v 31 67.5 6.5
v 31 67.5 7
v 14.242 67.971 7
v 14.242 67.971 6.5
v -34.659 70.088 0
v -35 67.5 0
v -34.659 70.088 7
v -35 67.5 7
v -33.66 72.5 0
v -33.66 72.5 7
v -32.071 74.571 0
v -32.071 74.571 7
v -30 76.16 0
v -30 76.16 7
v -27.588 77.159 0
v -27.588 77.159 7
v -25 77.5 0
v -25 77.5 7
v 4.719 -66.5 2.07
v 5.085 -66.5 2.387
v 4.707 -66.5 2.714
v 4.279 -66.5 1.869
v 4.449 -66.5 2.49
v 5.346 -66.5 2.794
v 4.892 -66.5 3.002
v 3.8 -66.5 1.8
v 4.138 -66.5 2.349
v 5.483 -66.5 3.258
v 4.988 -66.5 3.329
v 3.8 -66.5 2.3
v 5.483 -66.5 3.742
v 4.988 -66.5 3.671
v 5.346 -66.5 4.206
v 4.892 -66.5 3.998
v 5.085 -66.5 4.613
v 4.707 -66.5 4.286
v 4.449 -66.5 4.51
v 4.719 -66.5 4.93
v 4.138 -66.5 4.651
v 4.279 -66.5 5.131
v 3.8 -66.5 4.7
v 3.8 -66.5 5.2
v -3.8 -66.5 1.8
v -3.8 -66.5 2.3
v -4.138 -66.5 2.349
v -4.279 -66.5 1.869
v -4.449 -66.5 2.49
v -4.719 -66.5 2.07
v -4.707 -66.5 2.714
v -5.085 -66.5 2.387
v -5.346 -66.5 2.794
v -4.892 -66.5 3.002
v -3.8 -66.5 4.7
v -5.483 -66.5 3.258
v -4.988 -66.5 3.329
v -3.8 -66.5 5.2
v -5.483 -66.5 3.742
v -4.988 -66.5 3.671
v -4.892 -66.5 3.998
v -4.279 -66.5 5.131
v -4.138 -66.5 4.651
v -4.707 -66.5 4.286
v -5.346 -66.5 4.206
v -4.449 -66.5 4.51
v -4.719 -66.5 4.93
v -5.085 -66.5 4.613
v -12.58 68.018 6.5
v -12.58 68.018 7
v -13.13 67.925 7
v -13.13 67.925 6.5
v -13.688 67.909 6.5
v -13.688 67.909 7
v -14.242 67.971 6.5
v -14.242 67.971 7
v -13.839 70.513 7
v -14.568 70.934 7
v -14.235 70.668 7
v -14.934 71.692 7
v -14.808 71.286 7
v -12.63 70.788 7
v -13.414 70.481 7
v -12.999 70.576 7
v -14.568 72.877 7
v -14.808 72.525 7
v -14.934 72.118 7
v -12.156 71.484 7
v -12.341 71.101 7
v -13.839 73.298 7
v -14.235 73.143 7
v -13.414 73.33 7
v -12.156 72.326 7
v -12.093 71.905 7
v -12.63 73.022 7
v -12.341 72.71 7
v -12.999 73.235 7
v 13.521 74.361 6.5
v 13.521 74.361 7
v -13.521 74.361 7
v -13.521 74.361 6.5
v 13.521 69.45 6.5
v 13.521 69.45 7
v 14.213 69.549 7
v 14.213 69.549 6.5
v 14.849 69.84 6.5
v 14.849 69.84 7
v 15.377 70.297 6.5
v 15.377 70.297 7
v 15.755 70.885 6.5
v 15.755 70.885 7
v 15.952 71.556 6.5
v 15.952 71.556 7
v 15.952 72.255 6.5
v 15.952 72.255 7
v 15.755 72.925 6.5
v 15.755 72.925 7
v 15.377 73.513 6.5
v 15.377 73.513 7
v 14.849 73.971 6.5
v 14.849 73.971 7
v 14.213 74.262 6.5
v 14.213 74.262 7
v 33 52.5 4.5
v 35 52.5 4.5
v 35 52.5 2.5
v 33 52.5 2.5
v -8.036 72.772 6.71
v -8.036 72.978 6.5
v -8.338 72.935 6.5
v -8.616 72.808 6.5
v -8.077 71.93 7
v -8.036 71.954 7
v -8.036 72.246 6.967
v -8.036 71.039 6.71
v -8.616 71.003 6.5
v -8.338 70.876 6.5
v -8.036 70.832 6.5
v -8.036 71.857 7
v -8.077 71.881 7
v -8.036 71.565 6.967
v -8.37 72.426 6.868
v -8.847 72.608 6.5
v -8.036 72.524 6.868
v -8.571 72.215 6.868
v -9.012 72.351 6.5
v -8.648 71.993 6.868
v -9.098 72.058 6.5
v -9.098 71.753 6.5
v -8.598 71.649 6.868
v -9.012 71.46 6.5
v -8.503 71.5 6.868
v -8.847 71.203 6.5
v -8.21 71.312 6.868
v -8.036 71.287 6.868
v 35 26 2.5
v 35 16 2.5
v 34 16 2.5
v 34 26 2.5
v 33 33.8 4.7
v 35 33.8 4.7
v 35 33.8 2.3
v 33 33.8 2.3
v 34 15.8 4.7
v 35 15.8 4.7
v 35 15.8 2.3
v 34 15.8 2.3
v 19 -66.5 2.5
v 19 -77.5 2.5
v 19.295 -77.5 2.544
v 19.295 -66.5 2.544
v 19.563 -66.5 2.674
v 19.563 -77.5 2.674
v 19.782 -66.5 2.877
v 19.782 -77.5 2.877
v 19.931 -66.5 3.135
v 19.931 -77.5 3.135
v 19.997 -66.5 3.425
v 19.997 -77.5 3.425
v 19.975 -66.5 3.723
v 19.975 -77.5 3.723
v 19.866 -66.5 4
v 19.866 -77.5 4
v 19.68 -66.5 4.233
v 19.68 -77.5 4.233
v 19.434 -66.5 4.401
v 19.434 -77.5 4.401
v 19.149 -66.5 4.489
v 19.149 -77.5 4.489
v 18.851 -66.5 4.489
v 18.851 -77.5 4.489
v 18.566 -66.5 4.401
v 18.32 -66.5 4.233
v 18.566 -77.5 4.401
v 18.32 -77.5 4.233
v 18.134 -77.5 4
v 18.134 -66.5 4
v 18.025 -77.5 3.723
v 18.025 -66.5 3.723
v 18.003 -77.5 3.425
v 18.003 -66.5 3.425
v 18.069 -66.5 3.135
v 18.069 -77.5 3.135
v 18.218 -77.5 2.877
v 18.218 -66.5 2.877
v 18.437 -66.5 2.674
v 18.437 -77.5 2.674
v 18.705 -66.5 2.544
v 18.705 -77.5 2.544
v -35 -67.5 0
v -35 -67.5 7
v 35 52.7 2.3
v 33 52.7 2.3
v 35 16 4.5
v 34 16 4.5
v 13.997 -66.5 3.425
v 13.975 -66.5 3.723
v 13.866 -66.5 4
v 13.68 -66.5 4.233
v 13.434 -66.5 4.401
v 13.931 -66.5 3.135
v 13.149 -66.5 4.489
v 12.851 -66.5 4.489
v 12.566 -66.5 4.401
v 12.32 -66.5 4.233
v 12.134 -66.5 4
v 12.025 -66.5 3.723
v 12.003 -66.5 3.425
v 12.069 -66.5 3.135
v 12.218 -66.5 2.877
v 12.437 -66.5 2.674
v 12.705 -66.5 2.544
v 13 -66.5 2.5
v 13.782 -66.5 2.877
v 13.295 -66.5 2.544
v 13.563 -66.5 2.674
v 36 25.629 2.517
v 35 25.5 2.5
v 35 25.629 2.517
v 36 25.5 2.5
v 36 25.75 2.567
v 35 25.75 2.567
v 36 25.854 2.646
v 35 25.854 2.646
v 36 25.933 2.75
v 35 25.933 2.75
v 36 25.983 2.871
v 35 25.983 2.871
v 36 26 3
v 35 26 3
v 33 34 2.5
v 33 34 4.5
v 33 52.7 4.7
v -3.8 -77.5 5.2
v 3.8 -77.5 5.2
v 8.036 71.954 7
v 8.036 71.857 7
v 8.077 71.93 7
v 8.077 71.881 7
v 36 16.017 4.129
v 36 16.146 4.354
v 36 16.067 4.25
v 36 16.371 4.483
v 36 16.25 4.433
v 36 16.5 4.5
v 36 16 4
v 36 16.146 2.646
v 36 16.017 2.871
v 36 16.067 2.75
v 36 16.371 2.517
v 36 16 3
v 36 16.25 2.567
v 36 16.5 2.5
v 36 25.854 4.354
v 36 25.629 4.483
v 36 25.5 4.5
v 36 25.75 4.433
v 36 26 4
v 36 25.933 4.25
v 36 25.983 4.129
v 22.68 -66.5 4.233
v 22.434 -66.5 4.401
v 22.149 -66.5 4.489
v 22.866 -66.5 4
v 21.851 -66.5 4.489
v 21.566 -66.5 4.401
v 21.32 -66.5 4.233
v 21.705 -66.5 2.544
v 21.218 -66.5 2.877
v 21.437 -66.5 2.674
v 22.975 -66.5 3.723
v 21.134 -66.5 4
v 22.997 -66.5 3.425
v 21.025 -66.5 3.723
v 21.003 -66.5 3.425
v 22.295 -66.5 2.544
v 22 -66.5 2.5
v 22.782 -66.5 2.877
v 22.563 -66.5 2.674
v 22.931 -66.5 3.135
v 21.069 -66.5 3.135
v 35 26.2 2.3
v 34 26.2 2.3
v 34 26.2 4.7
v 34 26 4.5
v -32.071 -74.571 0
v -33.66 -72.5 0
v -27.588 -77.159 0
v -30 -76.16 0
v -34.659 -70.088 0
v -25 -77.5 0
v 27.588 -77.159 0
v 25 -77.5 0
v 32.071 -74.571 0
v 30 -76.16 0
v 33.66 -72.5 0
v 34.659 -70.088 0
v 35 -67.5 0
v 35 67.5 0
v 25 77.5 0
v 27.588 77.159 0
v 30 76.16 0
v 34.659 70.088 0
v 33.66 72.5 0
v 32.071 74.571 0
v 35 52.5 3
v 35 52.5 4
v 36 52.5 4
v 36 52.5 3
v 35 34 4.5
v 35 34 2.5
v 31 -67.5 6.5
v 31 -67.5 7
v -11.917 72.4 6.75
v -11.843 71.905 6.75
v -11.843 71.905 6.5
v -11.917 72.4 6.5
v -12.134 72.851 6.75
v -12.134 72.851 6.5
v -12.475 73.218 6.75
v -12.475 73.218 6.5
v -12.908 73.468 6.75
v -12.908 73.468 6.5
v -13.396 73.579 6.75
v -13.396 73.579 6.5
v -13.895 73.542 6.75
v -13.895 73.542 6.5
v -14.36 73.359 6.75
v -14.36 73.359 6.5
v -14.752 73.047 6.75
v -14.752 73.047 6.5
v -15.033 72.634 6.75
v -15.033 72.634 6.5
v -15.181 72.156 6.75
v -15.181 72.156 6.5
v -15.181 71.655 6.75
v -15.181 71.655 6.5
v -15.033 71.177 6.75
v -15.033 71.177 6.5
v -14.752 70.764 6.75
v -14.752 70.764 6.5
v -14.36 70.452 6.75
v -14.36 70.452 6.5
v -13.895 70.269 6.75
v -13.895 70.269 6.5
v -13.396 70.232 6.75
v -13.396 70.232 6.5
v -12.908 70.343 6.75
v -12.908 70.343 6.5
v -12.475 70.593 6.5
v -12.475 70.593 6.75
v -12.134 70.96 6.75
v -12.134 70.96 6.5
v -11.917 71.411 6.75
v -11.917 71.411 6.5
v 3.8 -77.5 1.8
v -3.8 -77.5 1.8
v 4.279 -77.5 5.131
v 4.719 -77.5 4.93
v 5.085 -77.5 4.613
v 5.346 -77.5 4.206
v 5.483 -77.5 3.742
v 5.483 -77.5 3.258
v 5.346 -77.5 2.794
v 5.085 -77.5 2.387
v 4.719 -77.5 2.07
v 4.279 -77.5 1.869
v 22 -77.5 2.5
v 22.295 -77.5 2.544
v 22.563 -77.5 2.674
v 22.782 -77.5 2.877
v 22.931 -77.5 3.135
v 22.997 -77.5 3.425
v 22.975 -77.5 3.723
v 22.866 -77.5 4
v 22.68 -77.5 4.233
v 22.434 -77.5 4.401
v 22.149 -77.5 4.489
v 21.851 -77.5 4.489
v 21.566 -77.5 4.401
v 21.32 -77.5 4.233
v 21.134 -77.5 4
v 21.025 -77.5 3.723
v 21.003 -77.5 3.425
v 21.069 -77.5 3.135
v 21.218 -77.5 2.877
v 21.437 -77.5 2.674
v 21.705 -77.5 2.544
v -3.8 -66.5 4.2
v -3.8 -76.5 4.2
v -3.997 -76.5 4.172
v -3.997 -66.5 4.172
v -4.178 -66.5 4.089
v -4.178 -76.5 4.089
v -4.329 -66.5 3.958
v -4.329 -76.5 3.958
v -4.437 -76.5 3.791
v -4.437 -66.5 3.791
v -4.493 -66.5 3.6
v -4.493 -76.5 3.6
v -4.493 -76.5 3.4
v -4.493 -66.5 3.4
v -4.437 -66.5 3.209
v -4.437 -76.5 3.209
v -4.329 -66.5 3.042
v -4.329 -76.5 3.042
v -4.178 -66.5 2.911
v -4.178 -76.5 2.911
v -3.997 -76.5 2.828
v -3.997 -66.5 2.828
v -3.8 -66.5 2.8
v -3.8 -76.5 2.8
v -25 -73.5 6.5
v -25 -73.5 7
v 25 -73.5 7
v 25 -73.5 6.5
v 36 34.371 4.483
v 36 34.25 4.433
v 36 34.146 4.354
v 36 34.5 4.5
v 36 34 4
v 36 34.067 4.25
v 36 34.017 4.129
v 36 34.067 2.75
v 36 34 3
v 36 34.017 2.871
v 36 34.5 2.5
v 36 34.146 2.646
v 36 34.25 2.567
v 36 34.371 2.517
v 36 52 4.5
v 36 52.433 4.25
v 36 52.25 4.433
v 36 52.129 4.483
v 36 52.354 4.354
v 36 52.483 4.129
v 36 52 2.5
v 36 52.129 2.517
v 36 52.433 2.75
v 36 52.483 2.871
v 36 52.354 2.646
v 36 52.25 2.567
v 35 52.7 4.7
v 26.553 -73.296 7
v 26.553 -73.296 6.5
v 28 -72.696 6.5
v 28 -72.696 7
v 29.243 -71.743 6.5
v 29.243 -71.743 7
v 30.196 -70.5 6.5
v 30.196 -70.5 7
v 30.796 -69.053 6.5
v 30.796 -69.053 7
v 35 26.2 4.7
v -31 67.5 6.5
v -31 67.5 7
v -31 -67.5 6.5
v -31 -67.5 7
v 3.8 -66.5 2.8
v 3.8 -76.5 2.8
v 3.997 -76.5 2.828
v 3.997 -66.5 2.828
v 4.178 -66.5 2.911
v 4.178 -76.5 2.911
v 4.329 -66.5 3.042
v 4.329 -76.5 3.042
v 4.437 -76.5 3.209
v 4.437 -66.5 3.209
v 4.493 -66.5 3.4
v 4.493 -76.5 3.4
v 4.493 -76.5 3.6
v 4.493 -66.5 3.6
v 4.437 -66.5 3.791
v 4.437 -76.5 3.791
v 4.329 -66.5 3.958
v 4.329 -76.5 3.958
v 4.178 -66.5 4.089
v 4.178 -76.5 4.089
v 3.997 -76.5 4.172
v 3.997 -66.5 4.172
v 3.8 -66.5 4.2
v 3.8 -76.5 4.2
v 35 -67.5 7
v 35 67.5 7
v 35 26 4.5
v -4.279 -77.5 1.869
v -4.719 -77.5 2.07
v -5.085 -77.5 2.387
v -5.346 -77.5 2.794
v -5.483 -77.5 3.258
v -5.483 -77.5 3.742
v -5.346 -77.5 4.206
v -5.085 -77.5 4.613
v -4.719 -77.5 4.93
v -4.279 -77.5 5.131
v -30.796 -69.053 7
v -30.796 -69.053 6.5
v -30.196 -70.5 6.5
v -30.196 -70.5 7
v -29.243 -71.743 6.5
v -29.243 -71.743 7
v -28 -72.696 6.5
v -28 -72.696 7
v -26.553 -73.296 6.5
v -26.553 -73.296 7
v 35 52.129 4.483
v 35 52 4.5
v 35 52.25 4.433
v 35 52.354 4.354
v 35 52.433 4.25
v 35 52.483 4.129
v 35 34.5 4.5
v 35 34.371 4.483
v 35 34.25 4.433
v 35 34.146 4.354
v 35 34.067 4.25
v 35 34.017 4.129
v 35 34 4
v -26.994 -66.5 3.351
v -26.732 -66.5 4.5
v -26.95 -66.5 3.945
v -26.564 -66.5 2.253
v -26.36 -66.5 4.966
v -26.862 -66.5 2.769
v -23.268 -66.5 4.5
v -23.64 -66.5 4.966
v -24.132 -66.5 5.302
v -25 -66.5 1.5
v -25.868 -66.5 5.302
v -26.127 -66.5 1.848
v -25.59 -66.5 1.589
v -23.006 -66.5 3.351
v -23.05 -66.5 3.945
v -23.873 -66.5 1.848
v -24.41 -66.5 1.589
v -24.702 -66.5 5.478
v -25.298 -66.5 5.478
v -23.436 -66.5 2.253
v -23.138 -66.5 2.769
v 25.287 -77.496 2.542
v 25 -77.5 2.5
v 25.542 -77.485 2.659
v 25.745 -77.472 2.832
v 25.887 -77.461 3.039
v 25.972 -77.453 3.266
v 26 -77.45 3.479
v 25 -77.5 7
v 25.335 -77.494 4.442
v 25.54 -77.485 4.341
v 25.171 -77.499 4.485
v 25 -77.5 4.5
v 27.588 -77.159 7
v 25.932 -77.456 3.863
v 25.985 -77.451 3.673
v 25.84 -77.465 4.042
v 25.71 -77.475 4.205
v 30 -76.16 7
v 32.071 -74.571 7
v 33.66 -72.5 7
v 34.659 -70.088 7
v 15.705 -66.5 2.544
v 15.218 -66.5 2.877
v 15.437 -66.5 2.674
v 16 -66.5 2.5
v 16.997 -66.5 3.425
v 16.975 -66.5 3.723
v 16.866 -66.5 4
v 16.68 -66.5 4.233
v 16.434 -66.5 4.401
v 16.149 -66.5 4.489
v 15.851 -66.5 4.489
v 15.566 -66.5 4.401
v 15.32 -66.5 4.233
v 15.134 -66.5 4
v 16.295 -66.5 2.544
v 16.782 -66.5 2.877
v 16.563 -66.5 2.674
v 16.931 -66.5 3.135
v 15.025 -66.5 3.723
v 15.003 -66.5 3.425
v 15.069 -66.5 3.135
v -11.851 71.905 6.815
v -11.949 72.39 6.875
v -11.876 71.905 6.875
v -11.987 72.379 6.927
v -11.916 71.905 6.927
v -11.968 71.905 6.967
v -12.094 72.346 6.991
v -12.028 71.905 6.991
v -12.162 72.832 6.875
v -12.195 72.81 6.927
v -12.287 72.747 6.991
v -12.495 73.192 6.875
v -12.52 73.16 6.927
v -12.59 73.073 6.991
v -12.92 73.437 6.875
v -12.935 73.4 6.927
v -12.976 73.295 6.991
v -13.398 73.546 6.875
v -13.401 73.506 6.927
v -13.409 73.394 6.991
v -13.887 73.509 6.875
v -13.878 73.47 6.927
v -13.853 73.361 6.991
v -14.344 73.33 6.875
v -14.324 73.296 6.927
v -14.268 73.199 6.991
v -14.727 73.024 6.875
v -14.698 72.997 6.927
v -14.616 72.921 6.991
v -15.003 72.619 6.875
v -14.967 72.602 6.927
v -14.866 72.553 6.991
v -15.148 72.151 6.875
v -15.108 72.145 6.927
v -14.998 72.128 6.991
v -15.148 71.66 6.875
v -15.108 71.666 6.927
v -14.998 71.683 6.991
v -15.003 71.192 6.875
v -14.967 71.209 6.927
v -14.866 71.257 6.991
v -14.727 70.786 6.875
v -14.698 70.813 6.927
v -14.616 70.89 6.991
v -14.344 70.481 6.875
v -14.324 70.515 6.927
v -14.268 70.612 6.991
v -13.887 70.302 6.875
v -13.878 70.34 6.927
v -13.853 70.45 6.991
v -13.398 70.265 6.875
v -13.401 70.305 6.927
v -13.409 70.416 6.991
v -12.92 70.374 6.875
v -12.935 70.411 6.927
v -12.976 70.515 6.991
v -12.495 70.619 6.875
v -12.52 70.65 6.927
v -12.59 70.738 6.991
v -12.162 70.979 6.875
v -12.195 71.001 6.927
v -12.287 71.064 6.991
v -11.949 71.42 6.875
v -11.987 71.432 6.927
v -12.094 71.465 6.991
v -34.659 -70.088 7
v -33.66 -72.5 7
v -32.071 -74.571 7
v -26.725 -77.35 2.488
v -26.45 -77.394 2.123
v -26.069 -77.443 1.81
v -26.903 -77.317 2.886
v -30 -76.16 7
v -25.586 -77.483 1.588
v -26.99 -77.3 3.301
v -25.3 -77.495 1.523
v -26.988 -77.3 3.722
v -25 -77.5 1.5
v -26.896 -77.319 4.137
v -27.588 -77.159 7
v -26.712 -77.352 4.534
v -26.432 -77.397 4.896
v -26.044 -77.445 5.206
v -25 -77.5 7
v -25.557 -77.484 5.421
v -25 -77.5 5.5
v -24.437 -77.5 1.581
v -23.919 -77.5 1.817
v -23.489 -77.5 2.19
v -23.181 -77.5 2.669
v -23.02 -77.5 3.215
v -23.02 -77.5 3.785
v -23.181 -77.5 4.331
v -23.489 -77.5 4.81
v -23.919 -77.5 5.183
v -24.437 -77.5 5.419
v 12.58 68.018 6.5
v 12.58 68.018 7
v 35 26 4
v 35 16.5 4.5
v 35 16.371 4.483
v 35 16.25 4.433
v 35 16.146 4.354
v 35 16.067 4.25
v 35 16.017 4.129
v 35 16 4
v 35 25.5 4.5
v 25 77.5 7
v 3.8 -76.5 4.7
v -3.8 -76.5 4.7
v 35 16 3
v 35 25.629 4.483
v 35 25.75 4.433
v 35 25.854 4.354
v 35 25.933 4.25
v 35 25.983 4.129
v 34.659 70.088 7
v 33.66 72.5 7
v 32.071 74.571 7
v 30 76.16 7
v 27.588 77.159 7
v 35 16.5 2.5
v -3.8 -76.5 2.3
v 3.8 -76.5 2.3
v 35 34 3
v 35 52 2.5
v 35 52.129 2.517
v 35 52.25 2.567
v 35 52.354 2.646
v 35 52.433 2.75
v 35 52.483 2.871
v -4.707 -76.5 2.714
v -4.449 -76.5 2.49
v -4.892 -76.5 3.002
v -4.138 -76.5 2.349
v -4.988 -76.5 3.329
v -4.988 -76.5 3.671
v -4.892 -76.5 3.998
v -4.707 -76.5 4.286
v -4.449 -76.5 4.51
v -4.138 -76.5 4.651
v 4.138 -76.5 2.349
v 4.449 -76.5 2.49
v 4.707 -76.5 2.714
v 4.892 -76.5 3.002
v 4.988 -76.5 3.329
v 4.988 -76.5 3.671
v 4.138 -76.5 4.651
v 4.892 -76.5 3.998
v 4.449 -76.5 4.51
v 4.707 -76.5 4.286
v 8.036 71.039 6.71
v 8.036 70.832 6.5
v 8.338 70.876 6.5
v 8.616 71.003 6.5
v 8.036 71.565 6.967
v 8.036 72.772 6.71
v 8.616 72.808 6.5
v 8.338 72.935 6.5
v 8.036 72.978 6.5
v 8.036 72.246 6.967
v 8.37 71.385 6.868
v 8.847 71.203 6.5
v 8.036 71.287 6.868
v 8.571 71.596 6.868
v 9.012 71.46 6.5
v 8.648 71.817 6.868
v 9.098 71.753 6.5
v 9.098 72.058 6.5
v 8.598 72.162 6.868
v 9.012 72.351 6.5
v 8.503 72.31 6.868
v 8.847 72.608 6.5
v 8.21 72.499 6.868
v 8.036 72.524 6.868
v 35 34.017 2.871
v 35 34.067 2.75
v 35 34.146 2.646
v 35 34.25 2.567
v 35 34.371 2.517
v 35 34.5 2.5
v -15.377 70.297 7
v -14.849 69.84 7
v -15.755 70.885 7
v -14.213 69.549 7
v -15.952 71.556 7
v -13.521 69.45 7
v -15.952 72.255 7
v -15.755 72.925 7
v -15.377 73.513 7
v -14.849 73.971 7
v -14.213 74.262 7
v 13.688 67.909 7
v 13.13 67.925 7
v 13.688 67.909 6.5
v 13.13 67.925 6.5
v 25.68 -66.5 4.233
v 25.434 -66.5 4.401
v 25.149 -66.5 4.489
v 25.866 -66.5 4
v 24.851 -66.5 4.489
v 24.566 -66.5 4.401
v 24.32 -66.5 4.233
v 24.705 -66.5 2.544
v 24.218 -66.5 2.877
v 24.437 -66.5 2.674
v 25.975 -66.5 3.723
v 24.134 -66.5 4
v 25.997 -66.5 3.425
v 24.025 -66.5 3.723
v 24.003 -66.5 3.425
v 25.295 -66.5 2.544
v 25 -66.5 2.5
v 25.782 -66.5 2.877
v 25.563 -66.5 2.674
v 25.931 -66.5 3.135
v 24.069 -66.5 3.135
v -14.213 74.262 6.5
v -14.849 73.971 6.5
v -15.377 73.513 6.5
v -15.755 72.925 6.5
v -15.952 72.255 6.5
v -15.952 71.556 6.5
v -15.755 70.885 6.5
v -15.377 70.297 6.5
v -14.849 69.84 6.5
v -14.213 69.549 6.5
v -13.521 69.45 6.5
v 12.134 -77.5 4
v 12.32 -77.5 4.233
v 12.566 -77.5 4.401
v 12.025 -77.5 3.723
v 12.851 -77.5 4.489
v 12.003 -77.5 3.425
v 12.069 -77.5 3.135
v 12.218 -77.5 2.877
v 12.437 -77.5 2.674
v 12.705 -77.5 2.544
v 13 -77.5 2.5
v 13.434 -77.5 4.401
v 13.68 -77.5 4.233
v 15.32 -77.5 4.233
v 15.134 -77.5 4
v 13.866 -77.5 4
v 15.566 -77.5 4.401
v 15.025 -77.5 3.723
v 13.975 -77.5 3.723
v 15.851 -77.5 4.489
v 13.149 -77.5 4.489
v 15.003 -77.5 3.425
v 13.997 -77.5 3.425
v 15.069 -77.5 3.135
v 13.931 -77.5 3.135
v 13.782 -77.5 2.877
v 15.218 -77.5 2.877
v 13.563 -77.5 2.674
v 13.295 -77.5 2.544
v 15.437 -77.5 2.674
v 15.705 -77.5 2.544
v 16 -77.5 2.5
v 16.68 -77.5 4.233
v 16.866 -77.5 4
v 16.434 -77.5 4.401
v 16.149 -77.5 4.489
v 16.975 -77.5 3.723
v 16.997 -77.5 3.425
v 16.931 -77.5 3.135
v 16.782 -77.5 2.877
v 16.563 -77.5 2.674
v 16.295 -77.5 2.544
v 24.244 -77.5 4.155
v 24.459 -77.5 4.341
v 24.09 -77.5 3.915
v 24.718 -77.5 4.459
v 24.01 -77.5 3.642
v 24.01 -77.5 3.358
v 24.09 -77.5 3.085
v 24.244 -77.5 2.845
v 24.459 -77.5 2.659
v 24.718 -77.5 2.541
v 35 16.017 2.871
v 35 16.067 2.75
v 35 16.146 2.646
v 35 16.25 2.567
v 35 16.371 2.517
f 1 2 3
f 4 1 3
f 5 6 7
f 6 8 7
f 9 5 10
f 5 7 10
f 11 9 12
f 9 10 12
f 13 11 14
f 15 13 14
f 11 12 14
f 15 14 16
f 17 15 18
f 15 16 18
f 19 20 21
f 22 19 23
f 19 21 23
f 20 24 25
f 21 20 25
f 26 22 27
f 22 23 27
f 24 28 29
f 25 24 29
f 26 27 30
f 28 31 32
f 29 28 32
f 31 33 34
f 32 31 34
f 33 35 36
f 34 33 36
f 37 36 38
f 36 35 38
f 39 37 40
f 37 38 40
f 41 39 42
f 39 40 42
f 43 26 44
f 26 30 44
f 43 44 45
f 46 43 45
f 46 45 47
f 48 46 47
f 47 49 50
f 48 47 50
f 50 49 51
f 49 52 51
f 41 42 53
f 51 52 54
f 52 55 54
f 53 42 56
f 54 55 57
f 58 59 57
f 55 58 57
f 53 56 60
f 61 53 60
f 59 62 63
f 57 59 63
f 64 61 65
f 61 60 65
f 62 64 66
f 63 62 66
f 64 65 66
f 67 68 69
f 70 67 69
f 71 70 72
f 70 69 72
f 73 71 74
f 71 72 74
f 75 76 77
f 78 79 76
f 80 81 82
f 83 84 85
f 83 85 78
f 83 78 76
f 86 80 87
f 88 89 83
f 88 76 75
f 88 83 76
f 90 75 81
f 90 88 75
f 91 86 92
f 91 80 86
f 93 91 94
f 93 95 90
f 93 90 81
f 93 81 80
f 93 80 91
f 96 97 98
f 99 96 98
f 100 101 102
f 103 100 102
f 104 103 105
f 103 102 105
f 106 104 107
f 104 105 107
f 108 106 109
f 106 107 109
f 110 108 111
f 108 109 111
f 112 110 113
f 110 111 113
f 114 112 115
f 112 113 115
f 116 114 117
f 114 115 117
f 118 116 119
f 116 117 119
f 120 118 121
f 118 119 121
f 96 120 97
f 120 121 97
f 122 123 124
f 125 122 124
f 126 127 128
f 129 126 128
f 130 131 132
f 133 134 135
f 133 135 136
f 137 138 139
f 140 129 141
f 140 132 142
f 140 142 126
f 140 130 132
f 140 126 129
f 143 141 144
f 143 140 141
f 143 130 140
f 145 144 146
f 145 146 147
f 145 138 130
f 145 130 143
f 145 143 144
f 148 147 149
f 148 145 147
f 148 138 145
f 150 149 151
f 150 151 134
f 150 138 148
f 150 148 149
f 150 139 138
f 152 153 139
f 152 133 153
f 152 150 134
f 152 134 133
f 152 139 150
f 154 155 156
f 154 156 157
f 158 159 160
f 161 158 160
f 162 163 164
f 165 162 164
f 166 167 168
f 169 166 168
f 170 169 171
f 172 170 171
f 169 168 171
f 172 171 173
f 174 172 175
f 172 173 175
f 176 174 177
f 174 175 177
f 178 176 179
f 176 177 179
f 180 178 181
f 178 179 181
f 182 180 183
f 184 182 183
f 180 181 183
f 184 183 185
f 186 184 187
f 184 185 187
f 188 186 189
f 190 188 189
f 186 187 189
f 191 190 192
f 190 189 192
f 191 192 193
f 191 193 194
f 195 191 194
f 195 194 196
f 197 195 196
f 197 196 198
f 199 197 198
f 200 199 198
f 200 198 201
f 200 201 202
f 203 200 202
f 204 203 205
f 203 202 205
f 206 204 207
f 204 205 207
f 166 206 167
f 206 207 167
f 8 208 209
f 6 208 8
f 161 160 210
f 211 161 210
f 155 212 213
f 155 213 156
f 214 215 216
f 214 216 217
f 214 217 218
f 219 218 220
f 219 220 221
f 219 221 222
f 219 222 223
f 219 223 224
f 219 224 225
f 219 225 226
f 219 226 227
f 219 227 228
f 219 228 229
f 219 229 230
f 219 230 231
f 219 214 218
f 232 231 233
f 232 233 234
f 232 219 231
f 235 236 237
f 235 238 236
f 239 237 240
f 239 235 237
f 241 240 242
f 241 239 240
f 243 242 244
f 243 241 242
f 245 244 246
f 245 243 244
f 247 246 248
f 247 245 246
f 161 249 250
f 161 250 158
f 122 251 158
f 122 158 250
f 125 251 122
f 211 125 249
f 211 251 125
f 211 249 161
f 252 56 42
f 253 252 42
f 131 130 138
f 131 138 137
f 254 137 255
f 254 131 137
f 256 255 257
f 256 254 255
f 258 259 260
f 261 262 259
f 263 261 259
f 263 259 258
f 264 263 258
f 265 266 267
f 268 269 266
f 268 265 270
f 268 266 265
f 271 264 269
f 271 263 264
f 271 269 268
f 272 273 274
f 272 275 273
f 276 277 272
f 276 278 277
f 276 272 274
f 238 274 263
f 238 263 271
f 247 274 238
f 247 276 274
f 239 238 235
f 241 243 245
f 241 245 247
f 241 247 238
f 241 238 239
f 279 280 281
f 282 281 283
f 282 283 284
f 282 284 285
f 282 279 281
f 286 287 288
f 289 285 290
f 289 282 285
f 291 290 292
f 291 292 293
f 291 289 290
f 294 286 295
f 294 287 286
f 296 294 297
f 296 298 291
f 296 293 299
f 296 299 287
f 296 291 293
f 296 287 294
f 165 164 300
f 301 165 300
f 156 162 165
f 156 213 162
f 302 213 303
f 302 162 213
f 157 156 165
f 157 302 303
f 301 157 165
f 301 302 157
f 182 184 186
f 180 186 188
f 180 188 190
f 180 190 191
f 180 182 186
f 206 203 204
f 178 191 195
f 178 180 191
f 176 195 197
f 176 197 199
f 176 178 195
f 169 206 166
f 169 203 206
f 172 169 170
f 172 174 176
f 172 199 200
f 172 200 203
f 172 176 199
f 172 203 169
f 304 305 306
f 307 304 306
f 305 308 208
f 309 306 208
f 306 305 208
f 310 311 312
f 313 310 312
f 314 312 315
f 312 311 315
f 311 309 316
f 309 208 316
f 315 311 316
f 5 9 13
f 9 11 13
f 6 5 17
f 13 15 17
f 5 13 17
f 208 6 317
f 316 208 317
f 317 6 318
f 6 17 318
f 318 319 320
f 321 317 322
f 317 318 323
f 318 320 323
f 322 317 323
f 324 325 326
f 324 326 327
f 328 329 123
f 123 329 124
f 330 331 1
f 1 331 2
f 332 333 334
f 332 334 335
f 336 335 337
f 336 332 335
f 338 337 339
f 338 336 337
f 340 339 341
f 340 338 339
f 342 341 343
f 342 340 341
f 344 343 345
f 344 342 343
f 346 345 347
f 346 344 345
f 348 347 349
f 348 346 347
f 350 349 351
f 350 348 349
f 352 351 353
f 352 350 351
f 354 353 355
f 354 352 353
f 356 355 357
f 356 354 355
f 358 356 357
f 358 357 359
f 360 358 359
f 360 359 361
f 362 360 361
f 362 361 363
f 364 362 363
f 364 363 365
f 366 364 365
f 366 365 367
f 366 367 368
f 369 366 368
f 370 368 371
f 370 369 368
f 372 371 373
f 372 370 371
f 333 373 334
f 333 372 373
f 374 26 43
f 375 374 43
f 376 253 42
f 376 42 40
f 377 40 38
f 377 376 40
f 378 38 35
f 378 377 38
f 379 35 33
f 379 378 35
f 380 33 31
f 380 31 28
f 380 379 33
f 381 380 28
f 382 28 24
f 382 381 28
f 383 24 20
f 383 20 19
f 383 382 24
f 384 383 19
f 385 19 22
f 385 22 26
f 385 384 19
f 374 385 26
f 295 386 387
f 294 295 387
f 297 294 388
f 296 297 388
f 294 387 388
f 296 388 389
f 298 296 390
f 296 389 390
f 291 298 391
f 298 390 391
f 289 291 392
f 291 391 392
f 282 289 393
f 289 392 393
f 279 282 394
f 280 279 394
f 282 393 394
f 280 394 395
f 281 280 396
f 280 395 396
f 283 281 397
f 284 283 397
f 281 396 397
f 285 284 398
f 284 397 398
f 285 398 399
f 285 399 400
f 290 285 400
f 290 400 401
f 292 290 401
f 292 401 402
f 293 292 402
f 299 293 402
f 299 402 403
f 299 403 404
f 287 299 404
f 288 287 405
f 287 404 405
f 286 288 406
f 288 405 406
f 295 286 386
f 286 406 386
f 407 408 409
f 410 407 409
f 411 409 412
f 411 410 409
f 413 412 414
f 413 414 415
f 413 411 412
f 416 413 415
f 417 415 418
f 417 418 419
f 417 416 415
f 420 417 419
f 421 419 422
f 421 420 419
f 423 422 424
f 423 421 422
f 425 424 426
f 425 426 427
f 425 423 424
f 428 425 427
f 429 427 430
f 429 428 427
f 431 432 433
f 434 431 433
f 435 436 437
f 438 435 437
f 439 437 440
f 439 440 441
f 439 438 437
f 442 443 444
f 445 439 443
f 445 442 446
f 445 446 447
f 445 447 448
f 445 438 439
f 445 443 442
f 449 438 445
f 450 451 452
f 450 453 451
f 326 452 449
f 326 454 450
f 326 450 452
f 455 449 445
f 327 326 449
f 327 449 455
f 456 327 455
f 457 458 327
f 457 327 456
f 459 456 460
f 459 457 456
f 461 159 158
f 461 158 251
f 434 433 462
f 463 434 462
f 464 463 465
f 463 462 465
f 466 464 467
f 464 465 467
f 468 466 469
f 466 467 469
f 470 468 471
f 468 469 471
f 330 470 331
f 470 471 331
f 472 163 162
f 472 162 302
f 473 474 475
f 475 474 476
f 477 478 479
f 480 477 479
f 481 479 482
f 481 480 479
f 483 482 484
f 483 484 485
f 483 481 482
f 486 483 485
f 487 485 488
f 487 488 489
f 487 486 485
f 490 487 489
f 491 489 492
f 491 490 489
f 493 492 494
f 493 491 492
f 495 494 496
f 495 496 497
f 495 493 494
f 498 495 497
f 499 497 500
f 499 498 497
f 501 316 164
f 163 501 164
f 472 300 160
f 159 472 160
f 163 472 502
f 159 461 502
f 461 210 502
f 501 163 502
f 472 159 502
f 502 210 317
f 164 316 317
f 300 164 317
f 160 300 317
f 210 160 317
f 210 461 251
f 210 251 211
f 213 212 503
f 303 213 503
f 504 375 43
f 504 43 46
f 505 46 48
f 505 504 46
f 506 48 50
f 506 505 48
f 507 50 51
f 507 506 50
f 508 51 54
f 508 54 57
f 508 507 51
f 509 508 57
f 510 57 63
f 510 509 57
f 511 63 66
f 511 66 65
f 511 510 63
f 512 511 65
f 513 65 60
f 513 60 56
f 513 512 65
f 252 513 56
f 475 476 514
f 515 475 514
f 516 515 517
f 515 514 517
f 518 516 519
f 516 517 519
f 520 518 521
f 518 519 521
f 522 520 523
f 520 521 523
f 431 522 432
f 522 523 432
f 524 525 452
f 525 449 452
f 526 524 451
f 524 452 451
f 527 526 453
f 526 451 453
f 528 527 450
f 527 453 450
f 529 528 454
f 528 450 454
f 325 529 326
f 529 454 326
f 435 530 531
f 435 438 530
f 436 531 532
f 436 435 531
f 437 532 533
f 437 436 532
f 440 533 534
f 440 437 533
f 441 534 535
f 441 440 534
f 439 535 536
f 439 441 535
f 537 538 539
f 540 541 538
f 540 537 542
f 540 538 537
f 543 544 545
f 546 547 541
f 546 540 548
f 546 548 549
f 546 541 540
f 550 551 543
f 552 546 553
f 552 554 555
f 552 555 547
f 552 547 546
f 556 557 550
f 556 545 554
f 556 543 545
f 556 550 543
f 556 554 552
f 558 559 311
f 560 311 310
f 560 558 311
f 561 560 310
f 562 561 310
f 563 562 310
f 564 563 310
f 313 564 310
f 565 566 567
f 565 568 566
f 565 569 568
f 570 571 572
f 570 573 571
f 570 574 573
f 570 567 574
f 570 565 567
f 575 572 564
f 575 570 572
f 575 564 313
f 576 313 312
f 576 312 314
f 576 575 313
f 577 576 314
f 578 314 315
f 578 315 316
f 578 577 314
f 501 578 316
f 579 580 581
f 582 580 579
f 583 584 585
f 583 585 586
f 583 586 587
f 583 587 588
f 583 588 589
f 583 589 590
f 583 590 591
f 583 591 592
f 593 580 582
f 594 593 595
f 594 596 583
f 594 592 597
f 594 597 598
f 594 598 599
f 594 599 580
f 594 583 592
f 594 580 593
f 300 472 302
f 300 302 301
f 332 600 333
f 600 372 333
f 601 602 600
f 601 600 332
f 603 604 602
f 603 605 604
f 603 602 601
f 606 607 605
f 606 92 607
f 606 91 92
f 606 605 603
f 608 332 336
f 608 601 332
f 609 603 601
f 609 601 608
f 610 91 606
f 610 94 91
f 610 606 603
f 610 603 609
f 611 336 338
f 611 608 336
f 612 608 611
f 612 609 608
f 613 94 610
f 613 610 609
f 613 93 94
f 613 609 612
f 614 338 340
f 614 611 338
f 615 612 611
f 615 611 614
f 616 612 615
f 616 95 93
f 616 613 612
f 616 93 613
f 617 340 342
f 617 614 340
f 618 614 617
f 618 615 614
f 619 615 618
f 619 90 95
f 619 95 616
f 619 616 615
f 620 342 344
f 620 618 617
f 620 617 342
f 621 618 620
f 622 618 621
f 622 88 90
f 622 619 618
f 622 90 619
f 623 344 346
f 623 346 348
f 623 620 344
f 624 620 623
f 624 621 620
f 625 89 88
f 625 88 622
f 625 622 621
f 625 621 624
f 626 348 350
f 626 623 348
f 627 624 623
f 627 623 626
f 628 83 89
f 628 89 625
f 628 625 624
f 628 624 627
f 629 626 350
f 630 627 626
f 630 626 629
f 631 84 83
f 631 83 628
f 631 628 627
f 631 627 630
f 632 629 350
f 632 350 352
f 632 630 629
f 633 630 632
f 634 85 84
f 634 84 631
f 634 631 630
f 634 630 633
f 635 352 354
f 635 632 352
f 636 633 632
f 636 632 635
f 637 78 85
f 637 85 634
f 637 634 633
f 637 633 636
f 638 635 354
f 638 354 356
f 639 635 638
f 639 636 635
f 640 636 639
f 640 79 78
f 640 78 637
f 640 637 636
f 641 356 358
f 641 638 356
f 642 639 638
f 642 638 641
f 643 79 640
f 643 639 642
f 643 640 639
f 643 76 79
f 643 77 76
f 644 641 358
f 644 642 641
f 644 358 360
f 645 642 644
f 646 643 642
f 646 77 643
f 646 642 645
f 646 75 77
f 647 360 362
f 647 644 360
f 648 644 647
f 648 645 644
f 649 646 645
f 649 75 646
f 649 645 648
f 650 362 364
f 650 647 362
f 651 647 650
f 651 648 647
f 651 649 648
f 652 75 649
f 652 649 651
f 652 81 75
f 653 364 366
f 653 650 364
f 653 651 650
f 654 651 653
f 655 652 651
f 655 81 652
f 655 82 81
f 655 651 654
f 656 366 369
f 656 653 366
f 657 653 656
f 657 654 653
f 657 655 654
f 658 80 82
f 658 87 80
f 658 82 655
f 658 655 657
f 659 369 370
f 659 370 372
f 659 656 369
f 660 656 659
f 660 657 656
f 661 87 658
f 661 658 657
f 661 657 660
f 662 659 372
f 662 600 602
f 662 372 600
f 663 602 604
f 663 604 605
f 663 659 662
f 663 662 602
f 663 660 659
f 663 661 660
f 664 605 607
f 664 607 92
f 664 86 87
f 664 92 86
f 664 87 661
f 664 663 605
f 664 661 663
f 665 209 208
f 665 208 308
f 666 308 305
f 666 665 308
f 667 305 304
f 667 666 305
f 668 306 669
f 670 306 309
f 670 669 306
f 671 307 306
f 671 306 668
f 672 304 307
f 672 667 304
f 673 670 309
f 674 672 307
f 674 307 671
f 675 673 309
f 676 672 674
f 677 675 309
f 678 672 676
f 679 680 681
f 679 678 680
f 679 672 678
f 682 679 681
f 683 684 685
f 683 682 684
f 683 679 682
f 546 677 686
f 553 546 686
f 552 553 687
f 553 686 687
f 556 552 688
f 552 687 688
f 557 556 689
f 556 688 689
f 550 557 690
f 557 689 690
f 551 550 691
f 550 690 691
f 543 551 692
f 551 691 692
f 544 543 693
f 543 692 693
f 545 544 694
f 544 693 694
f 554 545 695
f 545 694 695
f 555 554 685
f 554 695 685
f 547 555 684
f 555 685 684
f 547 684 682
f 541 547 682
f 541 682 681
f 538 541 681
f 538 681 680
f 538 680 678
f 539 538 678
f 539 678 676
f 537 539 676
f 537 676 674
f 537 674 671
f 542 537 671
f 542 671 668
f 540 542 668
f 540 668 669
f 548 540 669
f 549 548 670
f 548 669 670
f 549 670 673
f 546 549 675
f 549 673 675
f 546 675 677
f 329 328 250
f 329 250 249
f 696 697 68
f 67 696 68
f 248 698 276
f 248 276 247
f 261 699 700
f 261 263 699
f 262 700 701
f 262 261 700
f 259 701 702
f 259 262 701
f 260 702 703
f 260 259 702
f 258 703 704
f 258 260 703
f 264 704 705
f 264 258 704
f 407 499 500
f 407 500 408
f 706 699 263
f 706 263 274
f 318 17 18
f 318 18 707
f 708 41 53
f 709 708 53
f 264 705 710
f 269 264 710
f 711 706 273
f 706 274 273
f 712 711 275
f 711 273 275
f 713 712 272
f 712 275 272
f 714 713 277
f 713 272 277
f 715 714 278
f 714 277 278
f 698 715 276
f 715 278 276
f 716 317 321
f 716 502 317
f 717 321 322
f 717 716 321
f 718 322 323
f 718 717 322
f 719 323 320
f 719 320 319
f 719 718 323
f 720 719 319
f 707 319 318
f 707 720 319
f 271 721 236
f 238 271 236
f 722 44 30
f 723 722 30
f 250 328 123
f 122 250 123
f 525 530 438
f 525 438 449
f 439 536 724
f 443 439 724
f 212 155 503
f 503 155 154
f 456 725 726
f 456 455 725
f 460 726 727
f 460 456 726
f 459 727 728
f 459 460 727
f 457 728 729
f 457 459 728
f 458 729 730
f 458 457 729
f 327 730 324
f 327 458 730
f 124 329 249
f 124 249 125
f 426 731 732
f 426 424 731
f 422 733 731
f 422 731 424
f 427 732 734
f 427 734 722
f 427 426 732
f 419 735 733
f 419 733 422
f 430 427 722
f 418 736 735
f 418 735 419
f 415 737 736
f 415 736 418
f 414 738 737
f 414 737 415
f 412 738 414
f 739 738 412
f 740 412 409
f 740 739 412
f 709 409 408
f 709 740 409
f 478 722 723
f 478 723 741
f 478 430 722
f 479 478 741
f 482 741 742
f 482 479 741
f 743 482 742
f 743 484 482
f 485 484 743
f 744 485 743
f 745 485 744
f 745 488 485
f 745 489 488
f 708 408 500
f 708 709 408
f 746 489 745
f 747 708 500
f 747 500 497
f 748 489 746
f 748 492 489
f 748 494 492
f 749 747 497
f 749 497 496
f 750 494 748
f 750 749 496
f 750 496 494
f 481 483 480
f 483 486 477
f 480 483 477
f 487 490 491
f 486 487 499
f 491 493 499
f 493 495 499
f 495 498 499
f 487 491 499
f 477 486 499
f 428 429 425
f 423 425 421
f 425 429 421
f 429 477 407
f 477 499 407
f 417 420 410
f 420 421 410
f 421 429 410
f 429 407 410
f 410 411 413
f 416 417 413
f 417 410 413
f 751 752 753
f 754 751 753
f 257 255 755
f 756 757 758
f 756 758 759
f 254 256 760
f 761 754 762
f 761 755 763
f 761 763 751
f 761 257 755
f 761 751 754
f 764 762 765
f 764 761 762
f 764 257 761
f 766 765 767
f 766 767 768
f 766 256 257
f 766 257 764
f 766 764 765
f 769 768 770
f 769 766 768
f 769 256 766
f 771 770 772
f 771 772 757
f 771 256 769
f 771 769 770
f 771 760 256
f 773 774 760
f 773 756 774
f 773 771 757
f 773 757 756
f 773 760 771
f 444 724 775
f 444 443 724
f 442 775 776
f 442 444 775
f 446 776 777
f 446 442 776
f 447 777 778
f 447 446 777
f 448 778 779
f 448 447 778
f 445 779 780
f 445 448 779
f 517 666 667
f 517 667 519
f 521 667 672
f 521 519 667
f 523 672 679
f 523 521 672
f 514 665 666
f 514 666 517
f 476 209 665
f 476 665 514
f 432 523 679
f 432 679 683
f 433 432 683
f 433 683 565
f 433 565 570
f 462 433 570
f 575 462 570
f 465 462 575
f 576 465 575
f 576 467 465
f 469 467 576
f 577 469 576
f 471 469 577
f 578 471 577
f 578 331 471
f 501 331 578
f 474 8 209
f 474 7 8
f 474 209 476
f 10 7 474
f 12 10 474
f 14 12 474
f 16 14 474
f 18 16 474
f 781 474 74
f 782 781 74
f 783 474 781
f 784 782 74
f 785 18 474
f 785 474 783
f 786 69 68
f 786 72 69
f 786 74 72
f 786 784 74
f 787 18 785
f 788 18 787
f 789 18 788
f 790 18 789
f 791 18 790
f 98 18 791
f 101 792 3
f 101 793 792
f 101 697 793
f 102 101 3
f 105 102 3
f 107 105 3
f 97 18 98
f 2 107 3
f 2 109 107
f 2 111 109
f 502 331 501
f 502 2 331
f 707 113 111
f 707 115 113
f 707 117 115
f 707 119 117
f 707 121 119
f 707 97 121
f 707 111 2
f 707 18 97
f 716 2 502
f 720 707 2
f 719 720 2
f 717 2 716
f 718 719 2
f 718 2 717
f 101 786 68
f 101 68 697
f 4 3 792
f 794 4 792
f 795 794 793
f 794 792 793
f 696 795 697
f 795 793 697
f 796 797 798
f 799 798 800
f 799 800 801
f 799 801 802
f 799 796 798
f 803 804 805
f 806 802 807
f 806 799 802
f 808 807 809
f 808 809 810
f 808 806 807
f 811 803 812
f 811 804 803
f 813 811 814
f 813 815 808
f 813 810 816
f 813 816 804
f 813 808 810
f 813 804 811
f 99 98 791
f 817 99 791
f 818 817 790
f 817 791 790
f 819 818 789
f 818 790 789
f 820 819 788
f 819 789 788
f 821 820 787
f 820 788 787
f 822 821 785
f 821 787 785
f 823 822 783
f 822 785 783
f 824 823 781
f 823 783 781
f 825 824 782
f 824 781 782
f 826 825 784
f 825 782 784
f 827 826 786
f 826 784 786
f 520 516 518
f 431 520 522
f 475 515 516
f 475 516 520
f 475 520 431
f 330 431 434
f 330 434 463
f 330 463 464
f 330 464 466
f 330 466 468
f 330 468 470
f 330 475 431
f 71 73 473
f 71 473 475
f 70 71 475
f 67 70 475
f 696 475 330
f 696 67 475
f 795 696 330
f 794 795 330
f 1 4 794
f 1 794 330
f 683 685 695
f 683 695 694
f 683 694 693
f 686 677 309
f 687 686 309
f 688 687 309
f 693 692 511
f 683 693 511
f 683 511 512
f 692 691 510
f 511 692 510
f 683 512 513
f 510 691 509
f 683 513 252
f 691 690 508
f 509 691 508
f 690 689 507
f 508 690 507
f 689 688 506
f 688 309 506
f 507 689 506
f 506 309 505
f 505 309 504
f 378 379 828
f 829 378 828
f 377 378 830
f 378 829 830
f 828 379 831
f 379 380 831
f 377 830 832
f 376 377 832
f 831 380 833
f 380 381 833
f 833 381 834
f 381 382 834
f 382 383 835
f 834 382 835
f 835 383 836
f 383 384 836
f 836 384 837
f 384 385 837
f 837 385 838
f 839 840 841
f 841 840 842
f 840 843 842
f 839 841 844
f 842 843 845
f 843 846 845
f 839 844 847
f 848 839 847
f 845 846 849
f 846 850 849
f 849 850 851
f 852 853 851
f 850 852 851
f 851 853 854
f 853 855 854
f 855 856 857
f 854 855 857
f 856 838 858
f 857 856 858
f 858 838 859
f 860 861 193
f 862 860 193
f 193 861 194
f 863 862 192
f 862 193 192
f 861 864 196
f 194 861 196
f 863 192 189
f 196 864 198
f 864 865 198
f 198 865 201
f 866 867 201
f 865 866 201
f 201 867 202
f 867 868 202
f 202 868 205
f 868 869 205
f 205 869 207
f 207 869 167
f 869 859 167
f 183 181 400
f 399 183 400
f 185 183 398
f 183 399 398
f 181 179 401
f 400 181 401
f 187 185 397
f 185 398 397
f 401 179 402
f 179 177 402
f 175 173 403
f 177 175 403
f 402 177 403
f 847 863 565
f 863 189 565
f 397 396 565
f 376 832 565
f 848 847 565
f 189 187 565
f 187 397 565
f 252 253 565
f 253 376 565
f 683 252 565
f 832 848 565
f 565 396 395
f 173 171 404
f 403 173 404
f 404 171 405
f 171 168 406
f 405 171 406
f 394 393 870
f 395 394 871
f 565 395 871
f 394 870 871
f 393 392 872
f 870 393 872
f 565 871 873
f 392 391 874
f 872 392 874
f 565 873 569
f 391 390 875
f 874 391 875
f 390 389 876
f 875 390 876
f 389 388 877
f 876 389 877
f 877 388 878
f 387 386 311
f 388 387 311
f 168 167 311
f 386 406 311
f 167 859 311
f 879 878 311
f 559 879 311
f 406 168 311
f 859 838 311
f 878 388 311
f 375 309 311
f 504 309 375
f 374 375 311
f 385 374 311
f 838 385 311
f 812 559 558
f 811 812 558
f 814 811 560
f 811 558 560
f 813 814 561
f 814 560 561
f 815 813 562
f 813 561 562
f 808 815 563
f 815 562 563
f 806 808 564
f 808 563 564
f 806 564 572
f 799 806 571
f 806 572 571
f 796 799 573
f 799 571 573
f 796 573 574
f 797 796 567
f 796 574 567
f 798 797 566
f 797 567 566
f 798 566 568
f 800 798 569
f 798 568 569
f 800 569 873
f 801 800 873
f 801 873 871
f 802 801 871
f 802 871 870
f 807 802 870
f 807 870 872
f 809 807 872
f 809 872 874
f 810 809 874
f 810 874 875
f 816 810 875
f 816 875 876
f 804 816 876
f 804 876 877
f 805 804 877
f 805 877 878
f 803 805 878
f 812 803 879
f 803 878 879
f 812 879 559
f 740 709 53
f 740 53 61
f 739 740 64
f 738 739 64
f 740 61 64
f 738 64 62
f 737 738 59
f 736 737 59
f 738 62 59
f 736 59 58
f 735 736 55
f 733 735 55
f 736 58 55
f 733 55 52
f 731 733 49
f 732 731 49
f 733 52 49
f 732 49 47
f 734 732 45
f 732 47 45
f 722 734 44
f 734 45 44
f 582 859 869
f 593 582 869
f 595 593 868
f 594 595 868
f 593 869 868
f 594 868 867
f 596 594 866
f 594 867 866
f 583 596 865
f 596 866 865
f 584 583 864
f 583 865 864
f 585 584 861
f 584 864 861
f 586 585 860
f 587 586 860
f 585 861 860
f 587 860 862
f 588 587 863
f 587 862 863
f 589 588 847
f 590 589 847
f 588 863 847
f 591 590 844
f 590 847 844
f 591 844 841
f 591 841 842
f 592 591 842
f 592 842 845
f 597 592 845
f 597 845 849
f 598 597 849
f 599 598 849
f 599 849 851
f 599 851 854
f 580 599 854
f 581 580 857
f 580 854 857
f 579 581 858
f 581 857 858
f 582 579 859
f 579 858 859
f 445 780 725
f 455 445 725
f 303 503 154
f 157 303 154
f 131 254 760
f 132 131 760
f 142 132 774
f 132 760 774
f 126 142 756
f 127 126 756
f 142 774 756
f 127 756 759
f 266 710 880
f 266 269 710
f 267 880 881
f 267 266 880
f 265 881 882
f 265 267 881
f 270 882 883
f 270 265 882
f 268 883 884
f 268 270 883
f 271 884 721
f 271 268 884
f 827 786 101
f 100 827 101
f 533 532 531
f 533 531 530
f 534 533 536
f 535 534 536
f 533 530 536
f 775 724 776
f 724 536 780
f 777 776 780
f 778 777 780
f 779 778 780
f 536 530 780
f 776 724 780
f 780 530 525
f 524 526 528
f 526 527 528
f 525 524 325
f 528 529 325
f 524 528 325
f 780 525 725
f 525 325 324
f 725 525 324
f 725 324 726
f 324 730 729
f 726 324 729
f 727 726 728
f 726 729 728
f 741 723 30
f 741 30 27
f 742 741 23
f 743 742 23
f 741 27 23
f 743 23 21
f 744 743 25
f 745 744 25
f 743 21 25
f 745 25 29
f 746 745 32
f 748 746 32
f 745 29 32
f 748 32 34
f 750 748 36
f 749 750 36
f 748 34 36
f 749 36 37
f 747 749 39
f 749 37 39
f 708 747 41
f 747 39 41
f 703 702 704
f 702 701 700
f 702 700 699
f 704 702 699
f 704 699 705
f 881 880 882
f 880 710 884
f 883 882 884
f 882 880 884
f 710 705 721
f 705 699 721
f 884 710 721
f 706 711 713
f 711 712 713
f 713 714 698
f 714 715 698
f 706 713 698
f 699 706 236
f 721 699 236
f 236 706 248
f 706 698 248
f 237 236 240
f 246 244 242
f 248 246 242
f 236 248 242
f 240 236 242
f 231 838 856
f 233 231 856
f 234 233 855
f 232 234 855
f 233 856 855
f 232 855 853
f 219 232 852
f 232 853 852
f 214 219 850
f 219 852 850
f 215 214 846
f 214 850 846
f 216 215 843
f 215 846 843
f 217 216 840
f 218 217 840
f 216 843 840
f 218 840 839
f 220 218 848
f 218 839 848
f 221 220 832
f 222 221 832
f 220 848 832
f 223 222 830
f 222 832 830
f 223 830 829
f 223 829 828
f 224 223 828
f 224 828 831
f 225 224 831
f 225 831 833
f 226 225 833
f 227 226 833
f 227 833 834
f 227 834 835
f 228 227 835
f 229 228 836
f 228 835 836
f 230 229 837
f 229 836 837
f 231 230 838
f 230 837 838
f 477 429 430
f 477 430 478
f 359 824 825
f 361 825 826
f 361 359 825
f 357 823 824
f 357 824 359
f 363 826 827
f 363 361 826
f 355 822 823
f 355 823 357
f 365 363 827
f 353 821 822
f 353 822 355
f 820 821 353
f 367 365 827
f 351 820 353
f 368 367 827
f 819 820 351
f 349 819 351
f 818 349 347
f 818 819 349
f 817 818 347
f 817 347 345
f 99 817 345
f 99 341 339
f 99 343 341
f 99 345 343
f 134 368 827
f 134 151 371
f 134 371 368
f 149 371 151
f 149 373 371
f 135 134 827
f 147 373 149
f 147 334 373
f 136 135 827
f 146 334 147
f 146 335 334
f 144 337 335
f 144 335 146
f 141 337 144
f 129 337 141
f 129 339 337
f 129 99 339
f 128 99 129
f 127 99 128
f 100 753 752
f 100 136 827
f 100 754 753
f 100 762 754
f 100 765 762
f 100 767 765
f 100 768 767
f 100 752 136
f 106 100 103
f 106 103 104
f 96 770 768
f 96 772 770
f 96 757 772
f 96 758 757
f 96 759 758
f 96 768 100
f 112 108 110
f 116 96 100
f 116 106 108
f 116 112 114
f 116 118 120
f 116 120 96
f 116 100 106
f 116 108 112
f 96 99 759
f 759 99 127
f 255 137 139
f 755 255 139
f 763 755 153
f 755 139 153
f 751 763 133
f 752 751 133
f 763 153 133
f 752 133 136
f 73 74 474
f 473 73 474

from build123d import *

# Parameters (mm, degrees)
SKETCH1_W           = 70
SKETCH1_H           = 155
BOSS_EXTRUDE1_DEPTH = 7
FILLET1_R           = 10
SKETCH3_W           = 2.4
SKETCH3_H           = 18.9
SKETCH3_W_2         = 2
SKETCH3_H_2         = 18.5
CUT_EXTRUDE1_DEPTH  = 2
SKETCH3_2_W         = 2
SKETCH3_2_H         = 18.5
BOSS_EXTRUDE2_DEPTH = 1
FILLET2_R           = 0.5
SKETCH4_W           = 2.4
SKETCH4_H           = 10.4
SKETCH4_W_2         = 2
SKETCH4_H_2         = 10
CUT_EXTRUDE2_DEPTH  = 1
SKETCH4_2_W         = 2
SKETCH4_2_H         = 10
BOSS_EXTRUDE3_DEPTH = 1
FILLET3_R           = 0.5
SKETCH6_R           = 2
SKETCH6_R_2         = 1
CUT_EXTRUDE3_DEPTH  = 11
BOSS_EXTRUDE4_DEPTH = 10
SKETCH8_R           = 1.678551751
CUT_EXTRUDE4_DEPTH  = 0.5
FILLET4_R           = 1.3
FILLET5_R           = 0.25


with BuildPart() as part:
    # Sketch1 → Boss-Extrude1 (new body)
    with BuildSketch(Plane.XY):
        Rectangle(SKETCH1_W, SKETCH1_H)
    extrude(amount=BOSS_EXTRUDE1_DEPTH)

    # Fillet1
    fillet1_edges = [part.edges().sort_by_distance(p)[0] for p in [
        (35, -77.5, 3.5),
        (-35, -77.5, 3.5),
        (-35, 77.5, 3.5),
        (35, 77.5, 3.5),
    ]]
    fillet(fillet1_edges, radius=FILLET1_R)

    # Sketch3 → Cut-Extrude1 (cut)
    with BuildSketch(Plane(origin=(35, 0, 0), x_dir=(0, 0, -1), z_dir=(1, 0, 0))):
        with Locations((-3.5, 43.25)):
            Rectangle(SKETCH3_W, SKETCH3_H)
        with Locations((-3.5, 43.25)):
            Rectangle(SKETCH3_W_2, SKETCH3_H_2, mode=Mode.SUBTRACT)
    extrude(amount=-CUT_EXTRUDE1_DEPTH, mode=Mode.SUBTRACT)

    # Sketch4 → Cut-Extrude2 (cut)
    with BuildSketch(Plane(origin=(35, 0, 0), x_dir=(0, 0, -1), z_dir=(1, 0, 0))):
        with Locations((-3.5, 21)):
            Rectangle(SKETCH4_W, SKETCH4_H)
        with Locations((-3.5, 21)):
            Rectangle(SKETCH4_W_2, SKETCH4_H_2, mode=Mode.SUBTRACT)
    extrude(amount=-CUT_EXTRUDE2_DEPTH, mode=Mode.SUBTRACT)

    # Sketch6 → Cut-Extrude3 (cut)
    with BuildSketch(Plane.XZ.offset(77.5)):
        with Locations(Location((-25, 3.5, 0), (0, 0, 270))):
            Circle(SKETCH6_R)
        with Locations(Location((22, 3.5, 0), (0, 0, 270))):
            Circle(SKETCH6_R_2)
        with Locations(Location((19, 3.5, 0), (0, 0, 270))):
            Circle(SKETCH6_R_2)
        with Locations(Location((16, 3.5, 0), (0, 0, 270))):
            Circle(SKETCH6_R_2)
        with Locations(Location((13, 3.5, 0), (0, 0, 270))):
            Circle(SKETCH6_R_2)
        with Locations(Location((25, 3.5, 0), (0, 0, 270))):
            Circle(SKETCH6_R_2)
        with BuildLine():
            Line((-3.8, 5.2), (3.8, 5.2))
            ThreePointArc((3.8, 5.2), (5.5, 3.5), (3.8, 1.8))
            Line((3.8, 1.8), (-3.8, 1.8))
            ThreePointArc((-3.8, 1.8), (-5.5, 3.5), (-3.8, 5.2))
        make_face()
    extrude(amount=-CUT_EXTRUDE3_DEPTH, mode=Mode.SUBTRACT)

    # Sketch7 → Boss-Extrude4 (add)
    with BuildSketch(Plane.XZ.offset(66.5)):
        with BuildLine():
            Line((-3.8, 2.3), (3.8, 2.3))
            ThreePointArc((3.8, 2.3), (5, 3.5), (3.8, 4.7))
            Line((3.8, 4.7), (-3.8, 4.7))
            ThreePointArc((-3.8, 4.7), (-5, 3.5), (-3.8, 2.3))
        make_face()
        with BuildLine():
            Line((-3.8, 2.8), (3.8, 2.8))
            ThreePointArc((3.8, 2.8), (4.5, 3.5), (3.8, 4.2))
            Line((3.8, 4.2), (-3.8, 4.2))
            ThreePointArc((-3.8, 4.2), (-4.5, 3.5), (-3.8, 2.8))
        make_face(mode=Mode.SUBTRACT)
    extrude(amount=BOSS_EXTRUDE4_DEPTH)

    # Sketch8 → Cut-Extrude4 (cut)
    # profile 1 of 2: a face of its own
    with BuildSketch(Plane.XY.offset(7)):
        with BuildLine():
            Line((-14.242131715, 67.97091146), (-31, 67.5))
            Line((-31, 67.5), (-31, -67.5))
            ThreePointArc((-31, -67.5), (-29.242640687, -71.742640687), (-25, -73.5))
            Line((-25, -73.5), (25, -73.5))
            ThreePointArc((25, -73.5), (29.242640687, -71.742640687), (31, -67.5))
            Line((31, -67.5), (31, 67.5))
            Line((31, 67.5), (14.242131715, 67.97091146))
            ThreePointArc((14.242131715, 67.97091146), (13.408727505, 67.906964941), (12.580229547, 68.017612435))
            Line((12.580229547, 68.017612435), (-12.580229547, 68.017612435))
            ThreePointArc((-12.580229547, 68.017612435), (-13.408727505, 67.906964941), (-14.242131715, 67.97091146))
        make_face()
    # profile 2 of 2: a face of its own
    with BuildSketch(Plane.XY.offset(7)):
        with BuildLine():
            Line((-13.521086818, 69.44976806), (13.521086818, 69.44976806))
            ThreePointArc((13.521086818, 69.44976806), (15.976705311, 71.905386553), (13.521086818, 74.361005047))
            Line((13.521086818, 74.361005047), (-13.521086818, 74.361005047))
            ThreePointArc((-13.521086818, 74.361005047), (-15.976705311, 71.905386553), (-13.521086818, 69.44976806))
        make_face()
        with Locations((-13.521086818, 71.905386553)):
            Circle(SKETCH8_R, mode=Mode.SUBTRACT)
        with BuildLine():
            ThreePointArc((8.03571554, 70.832453492), (9.108648601, 71.905386553), (8.03571554, 72.978319614))
            Line((8.03571554, 72.978319614), (-8.03571554, 72.978319614))
            ThreePointArc((-8.03571554, 72.978319614), (-9.108648601, 71.905386553), (-8.03571554, 70.832453492))
            Line((-8.03571554, 70.832453492), (8.03571554, 70.832453492))
        make_face(mode=Mode.SUBTRACT)
    extrude(amount=-CUT_EXTRUDE4_DEPTH, mode=Mode.SUBTRACT)

    # Fillet4
    # the kernel refuses this fillet: 1.3 mm, written as the material it takes off along each edge
    with BuildSketch(Plane(origin=(8.03571554, 72.978319614, 7), x_dir=(0, 0, -1), z_dir=(-1, 0, 0)), Plane(origin=(-8.03571554, 70.832453492, 7), x_dir=(0, 0, -1), z_dir=(1, 0, 0))) as fillet4_piece_1:
        with BuildLine():
            CenterArc((1.3, 1.024695077), FILLET4_R, 180, 52.020127555)
            Line((0, 1.024695077), (-0.026, 1.024695077))
            Line((-0.026, 1.024695077), (-0.026, 0))
            Line((-0.026, 0), (0, -0.026))
            ThreePointArc((0, -0.026), (0.25, -0.026), (0.484, -0.020493902))
            Line((0.484, -0.020493902), (0.5, 0))
        make_face()
    extrude(amount=16.07143108, mode=Mode.SUBTRACT)
    with BuildSketch(Plane(origin=(-8.03571554, 71.905386553, 7), x_dir=(0, 1, 0), z_dir=(1, 0, 0))) as fillet4_piece_2:
        with BuildLine():
            CenterArc((0.048237984, -1.3), FILLET4_R, 37.979872445, 52.020127555)
            Line((0.048237984, 0), (0.048237984, 0.026))
            Line((0.048237984, 0.026), (1.072933061, 0.026))
            Line((1.072933061, 0.026), (1.098933061, 0))
            ThreePointArc((1.098933061, 0), (1.098933061, -0.25), (1.093426962, -0.484))
            Line((1.093426962, -0.484), (1.072933061, -0.5))
        make_face()
    revolve(axis=Axis((-8.03571554, 71.905386553, 7), (0, 0, 1)), revolution_arc=180, mode=Mode.SUBTRACT)
    with BuildSketch(Plane(origin=(8.03571554, 71.905386553, 7), x_dir=(0, -1, 0), z_dir=(-1, 0, 0))) as fillet4_piece_3:
        with BuildLine():
            CenterArc((0.048237984, -1.3), FILLET4_R, 37.979872445, 52.020127555)
            Line((0.048237984, 0), (0.048237984, 0.026))
            Line((0.048237984, 0.026), (1.072933061, 0.026))
            Line((1.072933061, 0.026), (1.098933061, 0))
            ThreePointArc((1.098933061, 0), (1.098933061, -0.25), (1.093426962, -0.484))
            Line((1.093426962, -0.484), (1.072933061, -0.5))
        make_face()
    revolve(axis=Axis((8.03571554, 71.905386553, 7), (0, 0, 1)), revolution_arc=180, mode=Mode.SUBTRACT)

    # Fillet5
    fillet5_edges = [part.edges().sort_by_distance(p)[0] for p in [
        (-15.199638568, 71.905386553, 7),
    ]]
    fillet(fillet5_edges, radius=FILLET5_R)


with BuildPart() as body_2:
    # Sketch3<2> → Boss-Extrude2 (new body)
    with BuildSketch(Plane(origin=(35, 0, 0), x_dir=(0, 0, -1), z_dir=(1, 0, 0))):
        with Locations((-3.5, 43.25)):
            Rectangle(SKETCH3_2_W, SKETCH3_2_H)
    extrude(amount=BOSS_EXTRUDE2_DEPTH)

    # Fillet2
    fillet2_edges = [body_2.edges().sort_by_distance(p)[0] for p in [
        (35.5, 34, 2.5),
        (35.5, 34, 4.5),
        (35.5, 52.5, 4.5),
        (35.5, 52.5, 2.5),
    ]]
    fillet(fillet2_edges, radius=FILLET2_R)


with BuildPart() as body_3:
    # Sketch4<2> → Boss-Extrude3 (new body)
    with BuildSketch(Plane(origin=(35, 0, 0), x_dir=(0, 0, -1), z_dir=(1, 0, 0))):
        with Locations((-3.5, 21)):
            Rectangle(SKETCH4_2_W, SKETCH4_2_H)
    extrude(amount=BOSS_EXTRUDE3_DEPTH)

    # Fillet3
    fillet3_edges = [body_3.edges().sort_by_distance(p)[0] for p in [
        (35.5, 16, 4.5),
        (35.5, 26, 4.5),
        (35.5, 26, 2.5),
        (35.5, 16, 2.5),
    ]]
    fillet(fillet3_edges, radius=FILLET3_R)


solid = Compound([part.part, body_2.part, body_3.part])
